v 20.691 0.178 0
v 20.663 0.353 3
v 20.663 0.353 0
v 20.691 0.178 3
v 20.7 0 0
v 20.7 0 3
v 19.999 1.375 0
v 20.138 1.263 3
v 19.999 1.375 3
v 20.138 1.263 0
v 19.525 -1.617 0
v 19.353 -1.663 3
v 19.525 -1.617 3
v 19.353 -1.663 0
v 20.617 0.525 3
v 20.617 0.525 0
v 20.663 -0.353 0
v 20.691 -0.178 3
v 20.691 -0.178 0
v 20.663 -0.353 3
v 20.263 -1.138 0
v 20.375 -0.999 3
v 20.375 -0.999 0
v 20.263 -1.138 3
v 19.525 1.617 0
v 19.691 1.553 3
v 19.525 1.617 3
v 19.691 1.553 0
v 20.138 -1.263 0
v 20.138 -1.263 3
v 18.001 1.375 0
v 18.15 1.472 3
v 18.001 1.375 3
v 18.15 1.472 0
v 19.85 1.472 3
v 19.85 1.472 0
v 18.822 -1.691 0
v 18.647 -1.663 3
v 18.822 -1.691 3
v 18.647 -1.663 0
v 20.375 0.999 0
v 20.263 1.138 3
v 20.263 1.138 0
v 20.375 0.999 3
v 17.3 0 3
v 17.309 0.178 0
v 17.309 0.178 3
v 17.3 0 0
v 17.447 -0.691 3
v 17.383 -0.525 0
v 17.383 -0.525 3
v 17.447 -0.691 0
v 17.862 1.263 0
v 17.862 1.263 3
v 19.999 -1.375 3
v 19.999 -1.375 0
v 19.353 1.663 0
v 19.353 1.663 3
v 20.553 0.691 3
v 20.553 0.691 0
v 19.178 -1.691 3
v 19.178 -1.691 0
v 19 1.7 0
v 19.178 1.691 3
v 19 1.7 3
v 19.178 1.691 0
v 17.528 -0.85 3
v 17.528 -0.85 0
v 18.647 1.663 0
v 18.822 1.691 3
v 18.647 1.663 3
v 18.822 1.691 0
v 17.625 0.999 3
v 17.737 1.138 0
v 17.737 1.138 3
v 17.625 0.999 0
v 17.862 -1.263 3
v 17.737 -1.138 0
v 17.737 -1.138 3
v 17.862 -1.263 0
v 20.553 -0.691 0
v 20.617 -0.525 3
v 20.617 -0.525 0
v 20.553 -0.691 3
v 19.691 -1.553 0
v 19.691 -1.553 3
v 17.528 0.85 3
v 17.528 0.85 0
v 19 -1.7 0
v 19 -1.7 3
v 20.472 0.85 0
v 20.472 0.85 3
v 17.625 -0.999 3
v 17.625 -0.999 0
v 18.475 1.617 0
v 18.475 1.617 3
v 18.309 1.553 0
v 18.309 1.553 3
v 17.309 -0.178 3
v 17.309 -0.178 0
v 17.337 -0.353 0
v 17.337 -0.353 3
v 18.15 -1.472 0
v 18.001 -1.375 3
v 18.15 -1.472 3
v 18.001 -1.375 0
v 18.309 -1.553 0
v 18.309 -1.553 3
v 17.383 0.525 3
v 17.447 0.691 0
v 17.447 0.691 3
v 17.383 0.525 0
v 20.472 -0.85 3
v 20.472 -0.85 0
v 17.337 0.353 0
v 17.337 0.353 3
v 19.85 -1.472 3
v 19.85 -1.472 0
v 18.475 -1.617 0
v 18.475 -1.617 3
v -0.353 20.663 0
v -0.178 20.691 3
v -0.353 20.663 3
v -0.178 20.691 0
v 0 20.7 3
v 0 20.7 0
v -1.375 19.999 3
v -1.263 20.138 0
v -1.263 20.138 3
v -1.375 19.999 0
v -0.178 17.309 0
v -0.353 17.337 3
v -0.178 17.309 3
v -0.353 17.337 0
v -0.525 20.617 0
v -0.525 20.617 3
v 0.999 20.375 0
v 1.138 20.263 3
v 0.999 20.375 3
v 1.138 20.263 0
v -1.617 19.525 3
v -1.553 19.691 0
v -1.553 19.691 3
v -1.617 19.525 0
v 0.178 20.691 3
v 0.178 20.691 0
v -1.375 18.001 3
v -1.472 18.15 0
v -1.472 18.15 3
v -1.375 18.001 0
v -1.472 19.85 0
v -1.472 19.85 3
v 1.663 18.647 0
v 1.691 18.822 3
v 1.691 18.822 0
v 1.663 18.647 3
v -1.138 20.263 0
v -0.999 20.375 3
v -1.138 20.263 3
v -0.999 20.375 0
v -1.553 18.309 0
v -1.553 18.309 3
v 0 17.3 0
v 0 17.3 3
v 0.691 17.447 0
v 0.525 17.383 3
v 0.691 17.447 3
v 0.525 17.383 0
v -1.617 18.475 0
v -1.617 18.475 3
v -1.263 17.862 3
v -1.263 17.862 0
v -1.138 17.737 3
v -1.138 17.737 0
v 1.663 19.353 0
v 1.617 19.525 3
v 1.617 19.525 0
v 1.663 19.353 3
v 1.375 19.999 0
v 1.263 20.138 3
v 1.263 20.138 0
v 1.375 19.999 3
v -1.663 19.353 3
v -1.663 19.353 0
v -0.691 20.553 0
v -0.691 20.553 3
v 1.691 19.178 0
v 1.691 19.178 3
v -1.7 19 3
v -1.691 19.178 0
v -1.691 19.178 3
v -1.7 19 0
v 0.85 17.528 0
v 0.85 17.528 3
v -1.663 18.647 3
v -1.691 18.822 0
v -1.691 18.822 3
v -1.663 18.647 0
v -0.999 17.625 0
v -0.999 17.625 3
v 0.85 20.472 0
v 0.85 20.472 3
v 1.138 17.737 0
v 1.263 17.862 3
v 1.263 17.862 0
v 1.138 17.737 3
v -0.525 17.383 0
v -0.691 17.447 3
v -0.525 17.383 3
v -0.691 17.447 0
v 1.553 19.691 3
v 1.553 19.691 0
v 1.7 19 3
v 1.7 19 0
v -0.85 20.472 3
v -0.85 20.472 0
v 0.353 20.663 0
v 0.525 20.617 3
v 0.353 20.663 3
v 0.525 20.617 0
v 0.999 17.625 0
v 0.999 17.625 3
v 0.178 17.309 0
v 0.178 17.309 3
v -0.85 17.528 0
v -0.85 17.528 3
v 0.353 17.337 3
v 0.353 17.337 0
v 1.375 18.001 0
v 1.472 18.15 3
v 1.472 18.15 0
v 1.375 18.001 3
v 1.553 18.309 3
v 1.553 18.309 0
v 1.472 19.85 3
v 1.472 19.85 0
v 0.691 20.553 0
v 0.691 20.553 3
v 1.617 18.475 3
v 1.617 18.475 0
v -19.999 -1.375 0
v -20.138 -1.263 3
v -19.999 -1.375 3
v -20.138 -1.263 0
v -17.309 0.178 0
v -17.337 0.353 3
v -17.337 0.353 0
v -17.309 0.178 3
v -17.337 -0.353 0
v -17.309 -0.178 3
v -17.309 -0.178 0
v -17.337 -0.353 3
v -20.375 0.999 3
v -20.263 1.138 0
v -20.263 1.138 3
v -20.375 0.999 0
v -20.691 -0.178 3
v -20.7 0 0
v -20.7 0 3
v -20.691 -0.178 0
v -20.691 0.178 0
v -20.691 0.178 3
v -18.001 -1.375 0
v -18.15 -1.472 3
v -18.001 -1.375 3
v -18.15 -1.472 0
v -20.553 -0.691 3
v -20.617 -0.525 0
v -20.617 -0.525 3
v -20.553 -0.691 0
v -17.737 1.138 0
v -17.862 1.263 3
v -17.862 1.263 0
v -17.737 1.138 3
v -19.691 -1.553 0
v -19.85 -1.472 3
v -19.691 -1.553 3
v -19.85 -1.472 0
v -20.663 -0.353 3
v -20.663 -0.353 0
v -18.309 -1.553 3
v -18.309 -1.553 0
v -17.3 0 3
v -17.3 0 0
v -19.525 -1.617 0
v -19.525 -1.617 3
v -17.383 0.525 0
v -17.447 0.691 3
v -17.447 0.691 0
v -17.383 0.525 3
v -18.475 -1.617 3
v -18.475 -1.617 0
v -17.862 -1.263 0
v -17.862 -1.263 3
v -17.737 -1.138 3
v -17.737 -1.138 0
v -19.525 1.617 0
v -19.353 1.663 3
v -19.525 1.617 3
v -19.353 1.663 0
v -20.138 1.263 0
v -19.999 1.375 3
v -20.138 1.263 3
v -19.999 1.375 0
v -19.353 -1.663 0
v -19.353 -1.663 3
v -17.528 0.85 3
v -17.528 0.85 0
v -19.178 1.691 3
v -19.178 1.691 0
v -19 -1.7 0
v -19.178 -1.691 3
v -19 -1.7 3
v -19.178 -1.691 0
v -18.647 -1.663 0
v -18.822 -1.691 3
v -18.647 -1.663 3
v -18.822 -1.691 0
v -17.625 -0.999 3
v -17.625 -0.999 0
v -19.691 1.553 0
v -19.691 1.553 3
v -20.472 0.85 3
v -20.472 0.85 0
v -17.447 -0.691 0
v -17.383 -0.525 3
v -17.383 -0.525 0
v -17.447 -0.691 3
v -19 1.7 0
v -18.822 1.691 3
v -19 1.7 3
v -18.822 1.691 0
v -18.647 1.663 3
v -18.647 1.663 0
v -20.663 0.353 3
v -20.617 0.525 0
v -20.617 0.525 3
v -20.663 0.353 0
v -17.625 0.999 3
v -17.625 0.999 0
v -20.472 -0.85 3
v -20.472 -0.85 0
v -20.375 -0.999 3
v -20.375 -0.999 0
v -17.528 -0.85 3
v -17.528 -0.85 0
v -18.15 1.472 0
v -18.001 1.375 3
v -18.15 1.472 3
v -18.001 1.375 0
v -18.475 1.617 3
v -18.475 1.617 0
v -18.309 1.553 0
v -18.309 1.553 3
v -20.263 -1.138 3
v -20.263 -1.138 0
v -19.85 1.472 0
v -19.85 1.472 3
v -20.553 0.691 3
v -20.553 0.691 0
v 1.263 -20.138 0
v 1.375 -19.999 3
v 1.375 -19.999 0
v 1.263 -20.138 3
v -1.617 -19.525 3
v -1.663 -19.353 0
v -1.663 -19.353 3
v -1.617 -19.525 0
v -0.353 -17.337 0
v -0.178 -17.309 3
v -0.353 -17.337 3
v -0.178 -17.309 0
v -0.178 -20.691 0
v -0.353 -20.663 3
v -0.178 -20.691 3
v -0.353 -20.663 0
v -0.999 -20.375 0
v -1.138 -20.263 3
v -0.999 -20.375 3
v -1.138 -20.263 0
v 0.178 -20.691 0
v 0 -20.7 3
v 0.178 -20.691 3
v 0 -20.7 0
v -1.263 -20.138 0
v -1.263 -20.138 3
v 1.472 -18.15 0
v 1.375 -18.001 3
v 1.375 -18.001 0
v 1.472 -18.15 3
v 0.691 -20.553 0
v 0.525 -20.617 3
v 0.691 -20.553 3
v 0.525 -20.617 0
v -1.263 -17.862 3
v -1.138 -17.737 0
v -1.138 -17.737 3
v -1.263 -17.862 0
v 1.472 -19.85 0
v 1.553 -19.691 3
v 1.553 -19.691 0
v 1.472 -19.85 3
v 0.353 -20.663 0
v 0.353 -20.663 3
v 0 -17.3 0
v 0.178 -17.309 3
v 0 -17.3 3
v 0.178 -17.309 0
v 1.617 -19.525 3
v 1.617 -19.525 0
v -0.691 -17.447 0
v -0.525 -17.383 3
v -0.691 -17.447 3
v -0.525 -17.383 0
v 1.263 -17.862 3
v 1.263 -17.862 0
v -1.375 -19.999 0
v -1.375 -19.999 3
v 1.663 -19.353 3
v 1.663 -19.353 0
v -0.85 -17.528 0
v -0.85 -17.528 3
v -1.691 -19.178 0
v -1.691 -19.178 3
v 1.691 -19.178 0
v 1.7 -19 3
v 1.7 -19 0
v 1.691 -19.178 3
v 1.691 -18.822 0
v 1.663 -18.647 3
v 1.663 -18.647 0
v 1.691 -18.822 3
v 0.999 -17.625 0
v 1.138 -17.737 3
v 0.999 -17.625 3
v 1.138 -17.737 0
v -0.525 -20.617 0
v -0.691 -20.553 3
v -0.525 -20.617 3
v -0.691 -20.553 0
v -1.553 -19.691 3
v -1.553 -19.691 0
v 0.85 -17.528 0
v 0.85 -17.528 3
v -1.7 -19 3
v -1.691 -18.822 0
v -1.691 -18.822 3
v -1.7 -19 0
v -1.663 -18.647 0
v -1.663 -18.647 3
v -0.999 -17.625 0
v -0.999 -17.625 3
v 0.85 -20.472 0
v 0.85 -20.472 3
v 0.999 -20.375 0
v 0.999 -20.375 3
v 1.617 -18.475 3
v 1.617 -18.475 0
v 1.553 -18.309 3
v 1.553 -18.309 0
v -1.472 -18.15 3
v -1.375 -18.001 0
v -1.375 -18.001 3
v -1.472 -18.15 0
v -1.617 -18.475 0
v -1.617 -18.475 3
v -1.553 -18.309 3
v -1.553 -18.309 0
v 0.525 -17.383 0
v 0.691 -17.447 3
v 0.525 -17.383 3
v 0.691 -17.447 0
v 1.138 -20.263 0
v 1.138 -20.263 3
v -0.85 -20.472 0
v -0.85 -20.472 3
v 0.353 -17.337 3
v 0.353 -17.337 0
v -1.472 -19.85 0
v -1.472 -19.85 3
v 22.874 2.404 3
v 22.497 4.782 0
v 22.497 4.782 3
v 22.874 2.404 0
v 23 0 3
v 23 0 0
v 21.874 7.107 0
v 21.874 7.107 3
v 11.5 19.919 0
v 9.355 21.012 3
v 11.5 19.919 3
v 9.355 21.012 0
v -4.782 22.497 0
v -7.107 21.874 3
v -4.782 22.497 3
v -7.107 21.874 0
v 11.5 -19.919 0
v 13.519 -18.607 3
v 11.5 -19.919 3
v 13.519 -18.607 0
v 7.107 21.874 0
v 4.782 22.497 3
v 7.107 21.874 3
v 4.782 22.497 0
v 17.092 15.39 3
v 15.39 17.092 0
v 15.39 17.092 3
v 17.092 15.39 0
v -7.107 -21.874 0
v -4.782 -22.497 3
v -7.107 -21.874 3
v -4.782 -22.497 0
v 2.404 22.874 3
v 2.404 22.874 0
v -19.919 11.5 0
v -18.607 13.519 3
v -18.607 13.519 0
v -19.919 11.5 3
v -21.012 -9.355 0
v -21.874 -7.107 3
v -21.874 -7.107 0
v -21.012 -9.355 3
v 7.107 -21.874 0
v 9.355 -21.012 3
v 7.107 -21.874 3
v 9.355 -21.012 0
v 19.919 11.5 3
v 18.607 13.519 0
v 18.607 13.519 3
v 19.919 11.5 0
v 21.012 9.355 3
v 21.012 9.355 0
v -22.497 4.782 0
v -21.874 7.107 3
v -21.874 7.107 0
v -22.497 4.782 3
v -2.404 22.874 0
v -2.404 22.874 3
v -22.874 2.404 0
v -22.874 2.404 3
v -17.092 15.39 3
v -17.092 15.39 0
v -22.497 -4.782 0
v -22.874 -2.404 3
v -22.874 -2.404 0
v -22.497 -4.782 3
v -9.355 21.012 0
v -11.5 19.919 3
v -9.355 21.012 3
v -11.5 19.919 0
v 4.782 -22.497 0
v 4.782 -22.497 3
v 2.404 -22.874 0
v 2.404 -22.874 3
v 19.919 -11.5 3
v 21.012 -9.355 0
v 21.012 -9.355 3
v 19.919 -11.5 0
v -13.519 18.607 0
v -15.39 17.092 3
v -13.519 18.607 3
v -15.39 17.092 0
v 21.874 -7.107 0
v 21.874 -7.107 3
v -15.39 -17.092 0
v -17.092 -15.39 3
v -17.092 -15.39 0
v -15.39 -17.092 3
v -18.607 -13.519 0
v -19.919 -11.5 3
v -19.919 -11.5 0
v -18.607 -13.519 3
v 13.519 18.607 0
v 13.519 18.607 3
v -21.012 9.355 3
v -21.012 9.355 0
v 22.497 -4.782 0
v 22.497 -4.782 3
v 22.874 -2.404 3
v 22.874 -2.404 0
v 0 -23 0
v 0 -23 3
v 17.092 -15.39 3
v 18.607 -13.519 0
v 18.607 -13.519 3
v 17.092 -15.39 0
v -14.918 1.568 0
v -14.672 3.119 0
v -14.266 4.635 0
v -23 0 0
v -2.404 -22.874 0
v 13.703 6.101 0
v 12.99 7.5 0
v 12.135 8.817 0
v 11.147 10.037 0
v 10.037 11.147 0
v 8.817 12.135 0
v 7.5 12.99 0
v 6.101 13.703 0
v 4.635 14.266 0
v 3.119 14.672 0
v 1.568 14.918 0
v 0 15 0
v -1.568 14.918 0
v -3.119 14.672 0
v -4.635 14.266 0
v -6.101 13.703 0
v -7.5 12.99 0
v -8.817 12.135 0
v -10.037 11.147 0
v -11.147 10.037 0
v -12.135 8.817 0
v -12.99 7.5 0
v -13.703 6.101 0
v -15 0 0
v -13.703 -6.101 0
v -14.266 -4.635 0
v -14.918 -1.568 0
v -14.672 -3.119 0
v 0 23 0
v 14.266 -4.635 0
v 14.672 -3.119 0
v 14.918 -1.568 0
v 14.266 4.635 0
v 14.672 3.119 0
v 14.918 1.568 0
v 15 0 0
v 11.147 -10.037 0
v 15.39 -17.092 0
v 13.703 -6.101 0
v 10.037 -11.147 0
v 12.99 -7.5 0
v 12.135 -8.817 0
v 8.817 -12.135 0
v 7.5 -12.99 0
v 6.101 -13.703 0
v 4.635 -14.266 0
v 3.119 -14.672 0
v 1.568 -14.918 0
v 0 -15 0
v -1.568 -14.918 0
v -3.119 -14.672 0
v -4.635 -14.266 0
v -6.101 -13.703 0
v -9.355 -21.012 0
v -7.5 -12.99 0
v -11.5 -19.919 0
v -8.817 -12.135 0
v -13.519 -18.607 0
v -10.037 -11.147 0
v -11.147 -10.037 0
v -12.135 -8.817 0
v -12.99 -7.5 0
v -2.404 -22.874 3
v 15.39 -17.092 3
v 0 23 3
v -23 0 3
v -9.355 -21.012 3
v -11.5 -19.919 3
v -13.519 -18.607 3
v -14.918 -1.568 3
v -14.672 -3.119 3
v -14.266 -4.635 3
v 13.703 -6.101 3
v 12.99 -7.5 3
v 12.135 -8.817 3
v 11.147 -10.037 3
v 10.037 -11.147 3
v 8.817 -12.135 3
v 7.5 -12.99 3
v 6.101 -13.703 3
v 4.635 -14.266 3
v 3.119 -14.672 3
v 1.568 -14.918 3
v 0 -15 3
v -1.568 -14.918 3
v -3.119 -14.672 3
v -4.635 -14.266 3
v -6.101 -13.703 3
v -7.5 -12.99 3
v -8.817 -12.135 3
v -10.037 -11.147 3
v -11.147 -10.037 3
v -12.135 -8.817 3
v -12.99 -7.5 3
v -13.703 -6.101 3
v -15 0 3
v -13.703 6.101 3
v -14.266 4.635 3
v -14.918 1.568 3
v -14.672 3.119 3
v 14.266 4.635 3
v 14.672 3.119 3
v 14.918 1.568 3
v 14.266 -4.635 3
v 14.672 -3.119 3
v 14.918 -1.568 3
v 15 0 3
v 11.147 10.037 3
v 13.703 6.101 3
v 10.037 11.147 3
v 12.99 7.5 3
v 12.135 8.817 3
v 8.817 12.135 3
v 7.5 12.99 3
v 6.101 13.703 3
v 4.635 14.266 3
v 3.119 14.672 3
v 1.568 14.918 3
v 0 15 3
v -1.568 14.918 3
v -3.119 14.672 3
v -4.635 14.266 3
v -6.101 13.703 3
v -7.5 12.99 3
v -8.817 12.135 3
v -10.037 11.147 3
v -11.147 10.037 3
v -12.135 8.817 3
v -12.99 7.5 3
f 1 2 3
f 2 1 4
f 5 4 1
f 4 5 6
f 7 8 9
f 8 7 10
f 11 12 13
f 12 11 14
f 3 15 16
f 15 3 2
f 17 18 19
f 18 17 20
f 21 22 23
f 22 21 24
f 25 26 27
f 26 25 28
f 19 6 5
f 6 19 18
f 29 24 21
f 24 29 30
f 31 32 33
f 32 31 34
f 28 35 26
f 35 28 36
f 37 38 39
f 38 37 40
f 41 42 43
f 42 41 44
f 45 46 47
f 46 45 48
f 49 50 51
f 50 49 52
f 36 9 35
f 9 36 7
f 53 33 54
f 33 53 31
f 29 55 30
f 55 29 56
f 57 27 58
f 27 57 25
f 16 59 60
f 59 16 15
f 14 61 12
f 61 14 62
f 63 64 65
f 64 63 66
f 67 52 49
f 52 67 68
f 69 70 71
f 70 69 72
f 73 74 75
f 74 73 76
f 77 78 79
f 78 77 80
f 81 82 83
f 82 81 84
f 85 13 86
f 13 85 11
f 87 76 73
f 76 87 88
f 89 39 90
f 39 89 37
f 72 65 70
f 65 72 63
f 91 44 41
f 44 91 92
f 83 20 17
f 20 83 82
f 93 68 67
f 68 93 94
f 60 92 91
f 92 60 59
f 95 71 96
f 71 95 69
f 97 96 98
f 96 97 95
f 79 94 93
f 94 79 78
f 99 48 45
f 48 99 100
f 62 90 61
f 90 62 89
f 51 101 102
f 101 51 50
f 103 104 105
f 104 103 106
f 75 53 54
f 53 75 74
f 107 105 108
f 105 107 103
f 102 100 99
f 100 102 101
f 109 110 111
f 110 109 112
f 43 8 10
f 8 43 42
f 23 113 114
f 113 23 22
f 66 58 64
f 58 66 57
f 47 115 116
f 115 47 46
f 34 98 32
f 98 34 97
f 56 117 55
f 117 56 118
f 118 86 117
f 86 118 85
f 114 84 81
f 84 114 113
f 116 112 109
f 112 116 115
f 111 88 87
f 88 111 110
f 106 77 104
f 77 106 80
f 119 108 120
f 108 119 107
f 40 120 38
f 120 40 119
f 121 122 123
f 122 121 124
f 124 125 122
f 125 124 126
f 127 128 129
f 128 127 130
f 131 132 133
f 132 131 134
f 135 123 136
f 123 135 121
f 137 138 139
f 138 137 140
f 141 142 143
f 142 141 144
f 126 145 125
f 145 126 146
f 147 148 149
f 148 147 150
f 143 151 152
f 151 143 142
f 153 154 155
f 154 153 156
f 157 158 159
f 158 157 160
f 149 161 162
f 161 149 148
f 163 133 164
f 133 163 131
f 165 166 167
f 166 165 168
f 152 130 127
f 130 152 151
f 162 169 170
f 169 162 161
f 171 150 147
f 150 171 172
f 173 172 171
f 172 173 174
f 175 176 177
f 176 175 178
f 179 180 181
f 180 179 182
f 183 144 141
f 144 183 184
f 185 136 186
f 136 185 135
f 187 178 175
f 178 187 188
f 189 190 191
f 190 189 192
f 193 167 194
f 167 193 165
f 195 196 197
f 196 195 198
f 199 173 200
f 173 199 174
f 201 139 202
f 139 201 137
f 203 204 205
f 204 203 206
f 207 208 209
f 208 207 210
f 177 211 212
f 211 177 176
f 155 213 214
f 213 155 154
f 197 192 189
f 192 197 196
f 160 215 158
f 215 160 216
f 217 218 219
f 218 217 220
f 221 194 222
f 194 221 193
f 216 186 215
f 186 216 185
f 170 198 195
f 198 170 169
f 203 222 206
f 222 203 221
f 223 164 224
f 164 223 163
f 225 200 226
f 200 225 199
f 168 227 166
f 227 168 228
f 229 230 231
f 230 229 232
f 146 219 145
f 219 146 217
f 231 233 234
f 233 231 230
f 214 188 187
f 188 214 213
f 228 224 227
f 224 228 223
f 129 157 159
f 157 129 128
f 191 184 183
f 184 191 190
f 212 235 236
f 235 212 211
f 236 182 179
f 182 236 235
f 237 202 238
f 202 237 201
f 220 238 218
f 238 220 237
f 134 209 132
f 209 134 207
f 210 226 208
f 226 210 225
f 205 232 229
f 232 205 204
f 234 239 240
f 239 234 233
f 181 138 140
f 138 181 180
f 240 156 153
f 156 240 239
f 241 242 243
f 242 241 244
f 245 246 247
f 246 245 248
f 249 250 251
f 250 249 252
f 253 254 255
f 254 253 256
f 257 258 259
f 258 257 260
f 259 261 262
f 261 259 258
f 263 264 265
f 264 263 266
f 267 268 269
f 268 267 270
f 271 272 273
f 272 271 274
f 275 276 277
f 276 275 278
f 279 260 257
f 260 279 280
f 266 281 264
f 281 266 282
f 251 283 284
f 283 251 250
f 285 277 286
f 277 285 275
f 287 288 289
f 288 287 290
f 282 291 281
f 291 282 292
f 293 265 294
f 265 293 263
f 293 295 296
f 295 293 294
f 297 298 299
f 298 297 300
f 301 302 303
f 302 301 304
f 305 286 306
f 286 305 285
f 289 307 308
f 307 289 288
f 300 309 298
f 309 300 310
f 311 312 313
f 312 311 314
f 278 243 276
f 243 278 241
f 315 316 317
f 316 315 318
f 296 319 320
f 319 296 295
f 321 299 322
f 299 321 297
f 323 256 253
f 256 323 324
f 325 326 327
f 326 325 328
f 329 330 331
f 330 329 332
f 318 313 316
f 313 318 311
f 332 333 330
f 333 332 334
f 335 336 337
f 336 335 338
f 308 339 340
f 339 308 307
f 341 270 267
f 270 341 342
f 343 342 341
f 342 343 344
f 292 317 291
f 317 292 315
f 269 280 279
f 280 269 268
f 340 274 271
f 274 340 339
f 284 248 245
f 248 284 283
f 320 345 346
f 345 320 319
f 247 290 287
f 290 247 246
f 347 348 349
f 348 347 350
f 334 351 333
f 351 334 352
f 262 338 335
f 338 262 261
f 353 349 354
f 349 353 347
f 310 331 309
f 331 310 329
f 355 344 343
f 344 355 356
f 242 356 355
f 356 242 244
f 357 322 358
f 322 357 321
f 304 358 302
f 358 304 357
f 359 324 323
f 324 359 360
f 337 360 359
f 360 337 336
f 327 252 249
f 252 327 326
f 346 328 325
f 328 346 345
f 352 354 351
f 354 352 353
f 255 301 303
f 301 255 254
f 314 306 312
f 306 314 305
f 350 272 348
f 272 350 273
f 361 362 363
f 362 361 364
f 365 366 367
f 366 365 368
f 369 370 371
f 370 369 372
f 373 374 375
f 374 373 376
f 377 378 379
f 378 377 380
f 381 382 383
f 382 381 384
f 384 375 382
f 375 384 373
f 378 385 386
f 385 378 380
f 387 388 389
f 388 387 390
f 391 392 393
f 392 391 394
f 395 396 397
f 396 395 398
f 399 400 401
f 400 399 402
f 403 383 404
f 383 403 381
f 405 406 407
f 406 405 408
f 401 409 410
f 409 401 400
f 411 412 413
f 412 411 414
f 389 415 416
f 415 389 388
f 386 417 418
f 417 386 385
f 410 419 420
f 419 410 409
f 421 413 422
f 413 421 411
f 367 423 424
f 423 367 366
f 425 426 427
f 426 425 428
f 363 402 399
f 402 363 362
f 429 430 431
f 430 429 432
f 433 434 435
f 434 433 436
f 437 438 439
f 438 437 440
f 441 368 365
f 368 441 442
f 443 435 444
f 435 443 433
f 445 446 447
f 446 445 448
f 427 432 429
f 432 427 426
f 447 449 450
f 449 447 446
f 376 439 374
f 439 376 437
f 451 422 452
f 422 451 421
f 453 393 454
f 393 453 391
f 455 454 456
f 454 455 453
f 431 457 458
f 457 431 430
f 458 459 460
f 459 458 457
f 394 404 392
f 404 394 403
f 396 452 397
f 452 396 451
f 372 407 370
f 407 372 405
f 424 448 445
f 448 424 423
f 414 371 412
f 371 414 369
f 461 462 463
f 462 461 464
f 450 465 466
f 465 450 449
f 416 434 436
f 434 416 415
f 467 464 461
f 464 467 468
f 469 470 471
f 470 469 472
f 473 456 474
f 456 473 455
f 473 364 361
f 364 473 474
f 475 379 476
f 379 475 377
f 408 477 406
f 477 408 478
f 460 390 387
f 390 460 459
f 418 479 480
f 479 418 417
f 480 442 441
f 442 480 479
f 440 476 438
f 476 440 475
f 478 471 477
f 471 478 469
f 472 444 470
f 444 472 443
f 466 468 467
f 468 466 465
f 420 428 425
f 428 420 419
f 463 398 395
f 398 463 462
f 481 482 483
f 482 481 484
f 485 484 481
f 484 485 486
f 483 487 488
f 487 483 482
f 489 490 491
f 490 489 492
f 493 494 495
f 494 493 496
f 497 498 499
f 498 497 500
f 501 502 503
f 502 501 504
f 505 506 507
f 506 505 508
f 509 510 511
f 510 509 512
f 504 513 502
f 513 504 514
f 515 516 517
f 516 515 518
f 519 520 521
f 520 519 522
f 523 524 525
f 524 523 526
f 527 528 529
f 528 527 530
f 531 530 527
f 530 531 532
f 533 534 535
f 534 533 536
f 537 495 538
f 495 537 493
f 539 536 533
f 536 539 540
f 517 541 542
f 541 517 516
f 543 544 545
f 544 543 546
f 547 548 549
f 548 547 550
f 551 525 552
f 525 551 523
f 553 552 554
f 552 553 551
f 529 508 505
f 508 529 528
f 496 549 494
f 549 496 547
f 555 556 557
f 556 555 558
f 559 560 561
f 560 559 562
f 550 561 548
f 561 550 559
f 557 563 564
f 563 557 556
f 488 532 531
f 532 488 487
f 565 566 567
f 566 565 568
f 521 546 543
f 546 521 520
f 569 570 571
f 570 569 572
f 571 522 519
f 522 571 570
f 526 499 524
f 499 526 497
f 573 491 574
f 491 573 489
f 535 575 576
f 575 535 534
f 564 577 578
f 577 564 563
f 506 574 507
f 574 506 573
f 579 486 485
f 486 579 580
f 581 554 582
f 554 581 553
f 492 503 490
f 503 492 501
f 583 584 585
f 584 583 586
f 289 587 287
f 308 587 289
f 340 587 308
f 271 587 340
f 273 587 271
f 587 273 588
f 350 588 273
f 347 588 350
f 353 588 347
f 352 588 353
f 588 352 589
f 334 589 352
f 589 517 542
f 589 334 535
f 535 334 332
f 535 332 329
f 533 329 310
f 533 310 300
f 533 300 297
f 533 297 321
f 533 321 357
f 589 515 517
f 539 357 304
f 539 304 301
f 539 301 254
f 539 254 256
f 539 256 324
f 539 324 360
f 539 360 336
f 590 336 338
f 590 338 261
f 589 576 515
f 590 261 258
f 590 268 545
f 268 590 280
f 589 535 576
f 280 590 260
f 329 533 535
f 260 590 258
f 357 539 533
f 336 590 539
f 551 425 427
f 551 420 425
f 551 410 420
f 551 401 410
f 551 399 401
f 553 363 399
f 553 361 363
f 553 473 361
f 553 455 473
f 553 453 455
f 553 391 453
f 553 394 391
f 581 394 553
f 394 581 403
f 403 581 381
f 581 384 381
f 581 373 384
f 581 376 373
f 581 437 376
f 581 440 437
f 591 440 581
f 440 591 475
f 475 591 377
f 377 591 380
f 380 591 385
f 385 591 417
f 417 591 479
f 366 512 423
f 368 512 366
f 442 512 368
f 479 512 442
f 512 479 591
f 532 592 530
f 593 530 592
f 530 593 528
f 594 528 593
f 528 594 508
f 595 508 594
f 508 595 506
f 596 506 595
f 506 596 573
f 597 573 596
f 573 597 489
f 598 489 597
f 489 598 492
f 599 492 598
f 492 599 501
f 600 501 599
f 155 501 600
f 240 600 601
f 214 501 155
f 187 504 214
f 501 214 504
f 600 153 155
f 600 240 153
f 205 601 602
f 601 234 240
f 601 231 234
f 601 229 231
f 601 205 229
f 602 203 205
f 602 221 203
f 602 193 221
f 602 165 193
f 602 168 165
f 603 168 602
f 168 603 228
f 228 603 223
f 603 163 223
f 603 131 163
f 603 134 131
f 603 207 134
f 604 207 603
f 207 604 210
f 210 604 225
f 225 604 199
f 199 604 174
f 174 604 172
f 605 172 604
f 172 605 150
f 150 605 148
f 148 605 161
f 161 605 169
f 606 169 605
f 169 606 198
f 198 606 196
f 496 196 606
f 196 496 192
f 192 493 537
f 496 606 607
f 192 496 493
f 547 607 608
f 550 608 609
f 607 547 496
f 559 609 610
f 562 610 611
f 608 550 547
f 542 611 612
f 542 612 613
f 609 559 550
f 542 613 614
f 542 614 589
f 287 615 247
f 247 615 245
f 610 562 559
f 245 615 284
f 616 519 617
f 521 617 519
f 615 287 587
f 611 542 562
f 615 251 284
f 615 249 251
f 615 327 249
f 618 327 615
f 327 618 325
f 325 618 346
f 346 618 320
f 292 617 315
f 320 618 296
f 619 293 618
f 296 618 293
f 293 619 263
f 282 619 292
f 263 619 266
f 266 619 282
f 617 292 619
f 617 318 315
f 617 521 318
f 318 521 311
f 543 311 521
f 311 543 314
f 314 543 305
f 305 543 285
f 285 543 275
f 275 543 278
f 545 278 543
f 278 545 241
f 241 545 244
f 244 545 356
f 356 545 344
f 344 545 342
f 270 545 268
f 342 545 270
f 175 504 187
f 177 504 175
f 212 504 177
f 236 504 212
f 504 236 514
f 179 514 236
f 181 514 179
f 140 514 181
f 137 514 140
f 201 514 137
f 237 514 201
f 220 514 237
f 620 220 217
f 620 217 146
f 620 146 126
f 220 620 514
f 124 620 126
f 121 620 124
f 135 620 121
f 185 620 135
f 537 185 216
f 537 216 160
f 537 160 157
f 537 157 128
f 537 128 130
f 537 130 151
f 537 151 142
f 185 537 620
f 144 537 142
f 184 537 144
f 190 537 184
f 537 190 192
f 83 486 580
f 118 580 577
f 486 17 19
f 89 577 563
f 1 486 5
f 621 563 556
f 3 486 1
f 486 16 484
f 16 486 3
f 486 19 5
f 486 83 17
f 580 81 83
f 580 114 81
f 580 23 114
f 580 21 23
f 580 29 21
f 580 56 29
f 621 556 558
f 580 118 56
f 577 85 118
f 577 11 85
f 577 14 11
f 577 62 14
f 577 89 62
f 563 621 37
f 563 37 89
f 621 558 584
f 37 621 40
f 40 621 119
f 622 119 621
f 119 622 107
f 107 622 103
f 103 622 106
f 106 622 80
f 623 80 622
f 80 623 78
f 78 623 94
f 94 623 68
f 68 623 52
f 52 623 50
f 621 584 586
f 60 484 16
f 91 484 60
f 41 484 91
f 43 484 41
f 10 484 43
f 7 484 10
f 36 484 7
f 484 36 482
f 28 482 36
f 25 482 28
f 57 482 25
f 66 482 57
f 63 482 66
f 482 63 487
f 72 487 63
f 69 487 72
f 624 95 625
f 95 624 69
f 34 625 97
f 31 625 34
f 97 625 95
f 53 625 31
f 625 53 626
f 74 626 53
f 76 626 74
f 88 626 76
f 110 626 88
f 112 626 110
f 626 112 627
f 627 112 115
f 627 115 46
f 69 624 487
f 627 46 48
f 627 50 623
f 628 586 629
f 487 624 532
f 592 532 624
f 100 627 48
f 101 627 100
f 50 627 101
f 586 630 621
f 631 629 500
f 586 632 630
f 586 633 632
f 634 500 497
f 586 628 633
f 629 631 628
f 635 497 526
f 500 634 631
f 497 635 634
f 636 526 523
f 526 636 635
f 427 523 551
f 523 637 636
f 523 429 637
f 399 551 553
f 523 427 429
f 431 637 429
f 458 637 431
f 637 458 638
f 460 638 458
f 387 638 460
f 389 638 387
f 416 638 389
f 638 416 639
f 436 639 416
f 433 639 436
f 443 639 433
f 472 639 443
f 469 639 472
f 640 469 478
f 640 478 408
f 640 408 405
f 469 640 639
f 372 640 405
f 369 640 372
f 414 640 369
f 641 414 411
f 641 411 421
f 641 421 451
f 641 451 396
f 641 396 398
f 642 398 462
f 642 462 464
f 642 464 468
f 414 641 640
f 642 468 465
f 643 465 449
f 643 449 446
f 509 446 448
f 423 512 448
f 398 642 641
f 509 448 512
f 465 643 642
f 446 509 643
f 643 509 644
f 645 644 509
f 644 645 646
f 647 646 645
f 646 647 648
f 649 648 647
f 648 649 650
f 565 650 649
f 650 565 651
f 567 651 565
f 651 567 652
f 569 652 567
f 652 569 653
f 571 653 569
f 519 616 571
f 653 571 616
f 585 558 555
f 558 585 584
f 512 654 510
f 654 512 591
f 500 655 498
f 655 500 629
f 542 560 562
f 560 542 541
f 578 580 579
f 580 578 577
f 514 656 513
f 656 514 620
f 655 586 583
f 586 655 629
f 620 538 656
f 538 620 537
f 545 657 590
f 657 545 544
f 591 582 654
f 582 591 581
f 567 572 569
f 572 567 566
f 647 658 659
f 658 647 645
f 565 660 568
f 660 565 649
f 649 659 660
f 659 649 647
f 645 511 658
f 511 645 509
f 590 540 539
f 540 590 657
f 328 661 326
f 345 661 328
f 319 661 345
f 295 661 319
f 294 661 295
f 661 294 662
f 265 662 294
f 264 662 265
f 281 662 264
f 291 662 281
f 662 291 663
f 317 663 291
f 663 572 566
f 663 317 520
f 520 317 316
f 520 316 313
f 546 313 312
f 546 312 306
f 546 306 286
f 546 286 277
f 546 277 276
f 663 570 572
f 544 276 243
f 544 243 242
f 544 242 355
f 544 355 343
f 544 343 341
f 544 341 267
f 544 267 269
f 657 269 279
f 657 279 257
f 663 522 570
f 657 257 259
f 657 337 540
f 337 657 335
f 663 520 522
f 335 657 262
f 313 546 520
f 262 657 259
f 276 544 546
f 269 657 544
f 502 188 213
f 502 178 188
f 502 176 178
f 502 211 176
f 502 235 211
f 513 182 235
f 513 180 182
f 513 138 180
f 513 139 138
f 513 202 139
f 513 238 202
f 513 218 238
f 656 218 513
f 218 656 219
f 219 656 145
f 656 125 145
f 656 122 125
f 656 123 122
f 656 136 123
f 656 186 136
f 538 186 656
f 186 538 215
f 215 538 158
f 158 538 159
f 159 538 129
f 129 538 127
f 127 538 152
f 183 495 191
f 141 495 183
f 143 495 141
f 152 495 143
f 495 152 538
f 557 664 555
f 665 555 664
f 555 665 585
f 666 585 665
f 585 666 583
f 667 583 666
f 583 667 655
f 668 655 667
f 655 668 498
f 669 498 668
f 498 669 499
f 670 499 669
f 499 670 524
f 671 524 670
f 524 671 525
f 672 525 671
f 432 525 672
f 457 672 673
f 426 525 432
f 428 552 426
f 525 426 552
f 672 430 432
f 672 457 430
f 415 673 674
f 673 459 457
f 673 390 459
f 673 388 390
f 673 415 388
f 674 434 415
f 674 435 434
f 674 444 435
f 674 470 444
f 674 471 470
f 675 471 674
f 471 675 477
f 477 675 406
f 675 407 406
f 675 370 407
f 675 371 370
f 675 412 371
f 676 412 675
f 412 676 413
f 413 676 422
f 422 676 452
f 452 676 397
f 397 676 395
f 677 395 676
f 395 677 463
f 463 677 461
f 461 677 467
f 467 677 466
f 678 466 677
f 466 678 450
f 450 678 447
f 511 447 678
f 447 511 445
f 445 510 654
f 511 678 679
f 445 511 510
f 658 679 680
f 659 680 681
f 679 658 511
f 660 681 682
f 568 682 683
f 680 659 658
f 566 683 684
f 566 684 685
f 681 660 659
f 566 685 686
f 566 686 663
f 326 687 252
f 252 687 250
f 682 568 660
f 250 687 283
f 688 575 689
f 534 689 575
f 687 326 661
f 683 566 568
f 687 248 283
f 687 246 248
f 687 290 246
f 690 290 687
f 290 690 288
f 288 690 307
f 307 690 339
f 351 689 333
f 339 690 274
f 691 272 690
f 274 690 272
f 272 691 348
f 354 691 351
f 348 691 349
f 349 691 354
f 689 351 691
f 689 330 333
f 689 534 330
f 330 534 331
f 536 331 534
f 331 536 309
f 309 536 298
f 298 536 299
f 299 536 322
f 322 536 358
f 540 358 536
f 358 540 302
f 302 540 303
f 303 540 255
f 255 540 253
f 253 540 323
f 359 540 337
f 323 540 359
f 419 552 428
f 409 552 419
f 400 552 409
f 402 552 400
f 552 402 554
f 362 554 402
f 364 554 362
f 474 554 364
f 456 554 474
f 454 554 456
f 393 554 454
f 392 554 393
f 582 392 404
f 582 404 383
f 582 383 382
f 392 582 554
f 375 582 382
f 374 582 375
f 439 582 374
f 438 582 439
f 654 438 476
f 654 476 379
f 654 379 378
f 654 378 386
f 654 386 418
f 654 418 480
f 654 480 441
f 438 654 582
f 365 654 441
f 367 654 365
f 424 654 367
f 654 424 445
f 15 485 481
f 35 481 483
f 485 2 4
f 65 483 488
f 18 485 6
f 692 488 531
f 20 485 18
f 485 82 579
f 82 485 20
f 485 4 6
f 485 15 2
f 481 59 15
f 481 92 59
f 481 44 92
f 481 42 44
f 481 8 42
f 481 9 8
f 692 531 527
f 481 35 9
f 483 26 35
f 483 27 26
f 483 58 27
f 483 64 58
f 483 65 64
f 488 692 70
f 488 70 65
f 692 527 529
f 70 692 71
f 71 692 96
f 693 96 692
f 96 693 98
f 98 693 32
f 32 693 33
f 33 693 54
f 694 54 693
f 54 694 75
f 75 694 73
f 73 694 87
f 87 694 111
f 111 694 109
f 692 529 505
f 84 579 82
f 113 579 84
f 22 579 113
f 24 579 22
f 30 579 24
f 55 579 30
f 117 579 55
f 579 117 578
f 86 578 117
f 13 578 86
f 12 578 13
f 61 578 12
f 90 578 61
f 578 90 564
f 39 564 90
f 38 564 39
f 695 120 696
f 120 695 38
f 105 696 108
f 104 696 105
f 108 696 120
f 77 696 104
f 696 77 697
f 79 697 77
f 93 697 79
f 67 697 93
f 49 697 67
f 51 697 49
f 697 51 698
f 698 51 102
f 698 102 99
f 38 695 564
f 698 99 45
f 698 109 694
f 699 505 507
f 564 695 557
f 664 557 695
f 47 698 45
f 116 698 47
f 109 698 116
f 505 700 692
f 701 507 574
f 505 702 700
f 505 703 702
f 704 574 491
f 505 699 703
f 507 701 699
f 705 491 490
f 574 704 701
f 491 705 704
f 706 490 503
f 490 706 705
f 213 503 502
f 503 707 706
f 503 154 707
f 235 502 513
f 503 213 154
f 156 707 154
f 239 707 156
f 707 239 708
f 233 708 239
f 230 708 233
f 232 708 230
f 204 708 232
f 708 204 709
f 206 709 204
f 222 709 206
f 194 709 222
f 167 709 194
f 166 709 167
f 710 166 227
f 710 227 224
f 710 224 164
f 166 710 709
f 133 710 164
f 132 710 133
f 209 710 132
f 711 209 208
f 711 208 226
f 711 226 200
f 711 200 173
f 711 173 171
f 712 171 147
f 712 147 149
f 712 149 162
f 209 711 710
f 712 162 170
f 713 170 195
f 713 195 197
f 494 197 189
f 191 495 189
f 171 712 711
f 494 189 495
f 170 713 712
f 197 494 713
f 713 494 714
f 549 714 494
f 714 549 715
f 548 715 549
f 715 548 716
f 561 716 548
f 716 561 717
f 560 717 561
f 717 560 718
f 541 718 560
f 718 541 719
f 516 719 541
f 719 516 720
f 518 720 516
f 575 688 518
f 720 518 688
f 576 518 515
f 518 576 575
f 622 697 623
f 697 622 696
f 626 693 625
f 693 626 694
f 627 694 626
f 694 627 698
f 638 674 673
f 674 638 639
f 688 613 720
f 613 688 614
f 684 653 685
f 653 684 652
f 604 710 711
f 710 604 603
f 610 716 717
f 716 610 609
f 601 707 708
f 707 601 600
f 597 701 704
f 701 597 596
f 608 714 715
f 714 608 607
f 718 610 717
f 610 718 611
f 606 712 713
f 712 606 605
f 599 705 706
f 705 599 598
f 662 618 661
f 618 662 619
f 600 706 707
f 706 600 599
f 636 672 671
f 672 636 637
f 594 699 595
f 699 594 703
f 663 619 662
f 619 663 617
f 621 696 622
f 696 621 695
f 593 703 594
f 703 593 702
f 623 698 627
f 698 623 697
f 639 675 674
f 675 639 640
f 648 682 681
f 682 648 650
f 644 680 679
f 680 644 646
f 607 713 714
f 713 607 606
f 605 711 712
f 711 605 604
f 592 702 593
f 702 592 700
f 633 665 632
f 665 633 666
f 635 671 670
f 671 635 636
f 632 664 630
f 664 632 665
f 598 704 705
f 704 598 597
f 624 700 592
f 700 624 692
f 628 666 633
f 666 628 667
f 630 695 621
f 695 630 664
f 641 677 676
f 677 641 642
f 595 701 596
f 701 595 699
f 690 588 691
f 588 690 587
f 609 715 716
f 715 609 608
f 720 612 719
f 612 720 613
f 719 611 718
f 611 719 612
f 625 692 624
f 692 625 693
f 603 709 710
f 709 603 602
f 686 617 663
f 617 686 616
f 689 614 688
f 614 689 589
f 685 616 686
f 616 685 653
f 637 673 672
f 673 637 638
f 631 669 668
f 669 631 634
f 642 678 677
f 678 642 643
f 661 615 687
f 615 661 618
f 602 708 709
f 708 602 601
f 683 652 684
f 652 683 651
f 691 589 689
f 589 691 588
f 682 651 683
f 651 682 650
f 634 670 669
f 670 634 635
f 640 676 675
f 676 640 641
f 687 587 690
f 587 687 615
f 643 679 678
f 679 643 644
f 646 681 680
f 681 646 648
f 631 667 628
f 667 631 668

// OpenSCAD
// Bearing retaining ring.
$fn = 60;
eps = 0.02;
bearing_d = 30;
outer_d = 46;
thickness = 3;
difference() {
    cylinder(d=outer_d,h=thickness);
    translate([0,0,-eps]) cylinder(d=bearing_d,h=thickness+2*eps);
    for (i=[0:3]) rotate([0,0,i*90]) translate([outer_d/2-4,0,-eps]) cylinder(d=3.4,h=thickness+2*eps);
}
